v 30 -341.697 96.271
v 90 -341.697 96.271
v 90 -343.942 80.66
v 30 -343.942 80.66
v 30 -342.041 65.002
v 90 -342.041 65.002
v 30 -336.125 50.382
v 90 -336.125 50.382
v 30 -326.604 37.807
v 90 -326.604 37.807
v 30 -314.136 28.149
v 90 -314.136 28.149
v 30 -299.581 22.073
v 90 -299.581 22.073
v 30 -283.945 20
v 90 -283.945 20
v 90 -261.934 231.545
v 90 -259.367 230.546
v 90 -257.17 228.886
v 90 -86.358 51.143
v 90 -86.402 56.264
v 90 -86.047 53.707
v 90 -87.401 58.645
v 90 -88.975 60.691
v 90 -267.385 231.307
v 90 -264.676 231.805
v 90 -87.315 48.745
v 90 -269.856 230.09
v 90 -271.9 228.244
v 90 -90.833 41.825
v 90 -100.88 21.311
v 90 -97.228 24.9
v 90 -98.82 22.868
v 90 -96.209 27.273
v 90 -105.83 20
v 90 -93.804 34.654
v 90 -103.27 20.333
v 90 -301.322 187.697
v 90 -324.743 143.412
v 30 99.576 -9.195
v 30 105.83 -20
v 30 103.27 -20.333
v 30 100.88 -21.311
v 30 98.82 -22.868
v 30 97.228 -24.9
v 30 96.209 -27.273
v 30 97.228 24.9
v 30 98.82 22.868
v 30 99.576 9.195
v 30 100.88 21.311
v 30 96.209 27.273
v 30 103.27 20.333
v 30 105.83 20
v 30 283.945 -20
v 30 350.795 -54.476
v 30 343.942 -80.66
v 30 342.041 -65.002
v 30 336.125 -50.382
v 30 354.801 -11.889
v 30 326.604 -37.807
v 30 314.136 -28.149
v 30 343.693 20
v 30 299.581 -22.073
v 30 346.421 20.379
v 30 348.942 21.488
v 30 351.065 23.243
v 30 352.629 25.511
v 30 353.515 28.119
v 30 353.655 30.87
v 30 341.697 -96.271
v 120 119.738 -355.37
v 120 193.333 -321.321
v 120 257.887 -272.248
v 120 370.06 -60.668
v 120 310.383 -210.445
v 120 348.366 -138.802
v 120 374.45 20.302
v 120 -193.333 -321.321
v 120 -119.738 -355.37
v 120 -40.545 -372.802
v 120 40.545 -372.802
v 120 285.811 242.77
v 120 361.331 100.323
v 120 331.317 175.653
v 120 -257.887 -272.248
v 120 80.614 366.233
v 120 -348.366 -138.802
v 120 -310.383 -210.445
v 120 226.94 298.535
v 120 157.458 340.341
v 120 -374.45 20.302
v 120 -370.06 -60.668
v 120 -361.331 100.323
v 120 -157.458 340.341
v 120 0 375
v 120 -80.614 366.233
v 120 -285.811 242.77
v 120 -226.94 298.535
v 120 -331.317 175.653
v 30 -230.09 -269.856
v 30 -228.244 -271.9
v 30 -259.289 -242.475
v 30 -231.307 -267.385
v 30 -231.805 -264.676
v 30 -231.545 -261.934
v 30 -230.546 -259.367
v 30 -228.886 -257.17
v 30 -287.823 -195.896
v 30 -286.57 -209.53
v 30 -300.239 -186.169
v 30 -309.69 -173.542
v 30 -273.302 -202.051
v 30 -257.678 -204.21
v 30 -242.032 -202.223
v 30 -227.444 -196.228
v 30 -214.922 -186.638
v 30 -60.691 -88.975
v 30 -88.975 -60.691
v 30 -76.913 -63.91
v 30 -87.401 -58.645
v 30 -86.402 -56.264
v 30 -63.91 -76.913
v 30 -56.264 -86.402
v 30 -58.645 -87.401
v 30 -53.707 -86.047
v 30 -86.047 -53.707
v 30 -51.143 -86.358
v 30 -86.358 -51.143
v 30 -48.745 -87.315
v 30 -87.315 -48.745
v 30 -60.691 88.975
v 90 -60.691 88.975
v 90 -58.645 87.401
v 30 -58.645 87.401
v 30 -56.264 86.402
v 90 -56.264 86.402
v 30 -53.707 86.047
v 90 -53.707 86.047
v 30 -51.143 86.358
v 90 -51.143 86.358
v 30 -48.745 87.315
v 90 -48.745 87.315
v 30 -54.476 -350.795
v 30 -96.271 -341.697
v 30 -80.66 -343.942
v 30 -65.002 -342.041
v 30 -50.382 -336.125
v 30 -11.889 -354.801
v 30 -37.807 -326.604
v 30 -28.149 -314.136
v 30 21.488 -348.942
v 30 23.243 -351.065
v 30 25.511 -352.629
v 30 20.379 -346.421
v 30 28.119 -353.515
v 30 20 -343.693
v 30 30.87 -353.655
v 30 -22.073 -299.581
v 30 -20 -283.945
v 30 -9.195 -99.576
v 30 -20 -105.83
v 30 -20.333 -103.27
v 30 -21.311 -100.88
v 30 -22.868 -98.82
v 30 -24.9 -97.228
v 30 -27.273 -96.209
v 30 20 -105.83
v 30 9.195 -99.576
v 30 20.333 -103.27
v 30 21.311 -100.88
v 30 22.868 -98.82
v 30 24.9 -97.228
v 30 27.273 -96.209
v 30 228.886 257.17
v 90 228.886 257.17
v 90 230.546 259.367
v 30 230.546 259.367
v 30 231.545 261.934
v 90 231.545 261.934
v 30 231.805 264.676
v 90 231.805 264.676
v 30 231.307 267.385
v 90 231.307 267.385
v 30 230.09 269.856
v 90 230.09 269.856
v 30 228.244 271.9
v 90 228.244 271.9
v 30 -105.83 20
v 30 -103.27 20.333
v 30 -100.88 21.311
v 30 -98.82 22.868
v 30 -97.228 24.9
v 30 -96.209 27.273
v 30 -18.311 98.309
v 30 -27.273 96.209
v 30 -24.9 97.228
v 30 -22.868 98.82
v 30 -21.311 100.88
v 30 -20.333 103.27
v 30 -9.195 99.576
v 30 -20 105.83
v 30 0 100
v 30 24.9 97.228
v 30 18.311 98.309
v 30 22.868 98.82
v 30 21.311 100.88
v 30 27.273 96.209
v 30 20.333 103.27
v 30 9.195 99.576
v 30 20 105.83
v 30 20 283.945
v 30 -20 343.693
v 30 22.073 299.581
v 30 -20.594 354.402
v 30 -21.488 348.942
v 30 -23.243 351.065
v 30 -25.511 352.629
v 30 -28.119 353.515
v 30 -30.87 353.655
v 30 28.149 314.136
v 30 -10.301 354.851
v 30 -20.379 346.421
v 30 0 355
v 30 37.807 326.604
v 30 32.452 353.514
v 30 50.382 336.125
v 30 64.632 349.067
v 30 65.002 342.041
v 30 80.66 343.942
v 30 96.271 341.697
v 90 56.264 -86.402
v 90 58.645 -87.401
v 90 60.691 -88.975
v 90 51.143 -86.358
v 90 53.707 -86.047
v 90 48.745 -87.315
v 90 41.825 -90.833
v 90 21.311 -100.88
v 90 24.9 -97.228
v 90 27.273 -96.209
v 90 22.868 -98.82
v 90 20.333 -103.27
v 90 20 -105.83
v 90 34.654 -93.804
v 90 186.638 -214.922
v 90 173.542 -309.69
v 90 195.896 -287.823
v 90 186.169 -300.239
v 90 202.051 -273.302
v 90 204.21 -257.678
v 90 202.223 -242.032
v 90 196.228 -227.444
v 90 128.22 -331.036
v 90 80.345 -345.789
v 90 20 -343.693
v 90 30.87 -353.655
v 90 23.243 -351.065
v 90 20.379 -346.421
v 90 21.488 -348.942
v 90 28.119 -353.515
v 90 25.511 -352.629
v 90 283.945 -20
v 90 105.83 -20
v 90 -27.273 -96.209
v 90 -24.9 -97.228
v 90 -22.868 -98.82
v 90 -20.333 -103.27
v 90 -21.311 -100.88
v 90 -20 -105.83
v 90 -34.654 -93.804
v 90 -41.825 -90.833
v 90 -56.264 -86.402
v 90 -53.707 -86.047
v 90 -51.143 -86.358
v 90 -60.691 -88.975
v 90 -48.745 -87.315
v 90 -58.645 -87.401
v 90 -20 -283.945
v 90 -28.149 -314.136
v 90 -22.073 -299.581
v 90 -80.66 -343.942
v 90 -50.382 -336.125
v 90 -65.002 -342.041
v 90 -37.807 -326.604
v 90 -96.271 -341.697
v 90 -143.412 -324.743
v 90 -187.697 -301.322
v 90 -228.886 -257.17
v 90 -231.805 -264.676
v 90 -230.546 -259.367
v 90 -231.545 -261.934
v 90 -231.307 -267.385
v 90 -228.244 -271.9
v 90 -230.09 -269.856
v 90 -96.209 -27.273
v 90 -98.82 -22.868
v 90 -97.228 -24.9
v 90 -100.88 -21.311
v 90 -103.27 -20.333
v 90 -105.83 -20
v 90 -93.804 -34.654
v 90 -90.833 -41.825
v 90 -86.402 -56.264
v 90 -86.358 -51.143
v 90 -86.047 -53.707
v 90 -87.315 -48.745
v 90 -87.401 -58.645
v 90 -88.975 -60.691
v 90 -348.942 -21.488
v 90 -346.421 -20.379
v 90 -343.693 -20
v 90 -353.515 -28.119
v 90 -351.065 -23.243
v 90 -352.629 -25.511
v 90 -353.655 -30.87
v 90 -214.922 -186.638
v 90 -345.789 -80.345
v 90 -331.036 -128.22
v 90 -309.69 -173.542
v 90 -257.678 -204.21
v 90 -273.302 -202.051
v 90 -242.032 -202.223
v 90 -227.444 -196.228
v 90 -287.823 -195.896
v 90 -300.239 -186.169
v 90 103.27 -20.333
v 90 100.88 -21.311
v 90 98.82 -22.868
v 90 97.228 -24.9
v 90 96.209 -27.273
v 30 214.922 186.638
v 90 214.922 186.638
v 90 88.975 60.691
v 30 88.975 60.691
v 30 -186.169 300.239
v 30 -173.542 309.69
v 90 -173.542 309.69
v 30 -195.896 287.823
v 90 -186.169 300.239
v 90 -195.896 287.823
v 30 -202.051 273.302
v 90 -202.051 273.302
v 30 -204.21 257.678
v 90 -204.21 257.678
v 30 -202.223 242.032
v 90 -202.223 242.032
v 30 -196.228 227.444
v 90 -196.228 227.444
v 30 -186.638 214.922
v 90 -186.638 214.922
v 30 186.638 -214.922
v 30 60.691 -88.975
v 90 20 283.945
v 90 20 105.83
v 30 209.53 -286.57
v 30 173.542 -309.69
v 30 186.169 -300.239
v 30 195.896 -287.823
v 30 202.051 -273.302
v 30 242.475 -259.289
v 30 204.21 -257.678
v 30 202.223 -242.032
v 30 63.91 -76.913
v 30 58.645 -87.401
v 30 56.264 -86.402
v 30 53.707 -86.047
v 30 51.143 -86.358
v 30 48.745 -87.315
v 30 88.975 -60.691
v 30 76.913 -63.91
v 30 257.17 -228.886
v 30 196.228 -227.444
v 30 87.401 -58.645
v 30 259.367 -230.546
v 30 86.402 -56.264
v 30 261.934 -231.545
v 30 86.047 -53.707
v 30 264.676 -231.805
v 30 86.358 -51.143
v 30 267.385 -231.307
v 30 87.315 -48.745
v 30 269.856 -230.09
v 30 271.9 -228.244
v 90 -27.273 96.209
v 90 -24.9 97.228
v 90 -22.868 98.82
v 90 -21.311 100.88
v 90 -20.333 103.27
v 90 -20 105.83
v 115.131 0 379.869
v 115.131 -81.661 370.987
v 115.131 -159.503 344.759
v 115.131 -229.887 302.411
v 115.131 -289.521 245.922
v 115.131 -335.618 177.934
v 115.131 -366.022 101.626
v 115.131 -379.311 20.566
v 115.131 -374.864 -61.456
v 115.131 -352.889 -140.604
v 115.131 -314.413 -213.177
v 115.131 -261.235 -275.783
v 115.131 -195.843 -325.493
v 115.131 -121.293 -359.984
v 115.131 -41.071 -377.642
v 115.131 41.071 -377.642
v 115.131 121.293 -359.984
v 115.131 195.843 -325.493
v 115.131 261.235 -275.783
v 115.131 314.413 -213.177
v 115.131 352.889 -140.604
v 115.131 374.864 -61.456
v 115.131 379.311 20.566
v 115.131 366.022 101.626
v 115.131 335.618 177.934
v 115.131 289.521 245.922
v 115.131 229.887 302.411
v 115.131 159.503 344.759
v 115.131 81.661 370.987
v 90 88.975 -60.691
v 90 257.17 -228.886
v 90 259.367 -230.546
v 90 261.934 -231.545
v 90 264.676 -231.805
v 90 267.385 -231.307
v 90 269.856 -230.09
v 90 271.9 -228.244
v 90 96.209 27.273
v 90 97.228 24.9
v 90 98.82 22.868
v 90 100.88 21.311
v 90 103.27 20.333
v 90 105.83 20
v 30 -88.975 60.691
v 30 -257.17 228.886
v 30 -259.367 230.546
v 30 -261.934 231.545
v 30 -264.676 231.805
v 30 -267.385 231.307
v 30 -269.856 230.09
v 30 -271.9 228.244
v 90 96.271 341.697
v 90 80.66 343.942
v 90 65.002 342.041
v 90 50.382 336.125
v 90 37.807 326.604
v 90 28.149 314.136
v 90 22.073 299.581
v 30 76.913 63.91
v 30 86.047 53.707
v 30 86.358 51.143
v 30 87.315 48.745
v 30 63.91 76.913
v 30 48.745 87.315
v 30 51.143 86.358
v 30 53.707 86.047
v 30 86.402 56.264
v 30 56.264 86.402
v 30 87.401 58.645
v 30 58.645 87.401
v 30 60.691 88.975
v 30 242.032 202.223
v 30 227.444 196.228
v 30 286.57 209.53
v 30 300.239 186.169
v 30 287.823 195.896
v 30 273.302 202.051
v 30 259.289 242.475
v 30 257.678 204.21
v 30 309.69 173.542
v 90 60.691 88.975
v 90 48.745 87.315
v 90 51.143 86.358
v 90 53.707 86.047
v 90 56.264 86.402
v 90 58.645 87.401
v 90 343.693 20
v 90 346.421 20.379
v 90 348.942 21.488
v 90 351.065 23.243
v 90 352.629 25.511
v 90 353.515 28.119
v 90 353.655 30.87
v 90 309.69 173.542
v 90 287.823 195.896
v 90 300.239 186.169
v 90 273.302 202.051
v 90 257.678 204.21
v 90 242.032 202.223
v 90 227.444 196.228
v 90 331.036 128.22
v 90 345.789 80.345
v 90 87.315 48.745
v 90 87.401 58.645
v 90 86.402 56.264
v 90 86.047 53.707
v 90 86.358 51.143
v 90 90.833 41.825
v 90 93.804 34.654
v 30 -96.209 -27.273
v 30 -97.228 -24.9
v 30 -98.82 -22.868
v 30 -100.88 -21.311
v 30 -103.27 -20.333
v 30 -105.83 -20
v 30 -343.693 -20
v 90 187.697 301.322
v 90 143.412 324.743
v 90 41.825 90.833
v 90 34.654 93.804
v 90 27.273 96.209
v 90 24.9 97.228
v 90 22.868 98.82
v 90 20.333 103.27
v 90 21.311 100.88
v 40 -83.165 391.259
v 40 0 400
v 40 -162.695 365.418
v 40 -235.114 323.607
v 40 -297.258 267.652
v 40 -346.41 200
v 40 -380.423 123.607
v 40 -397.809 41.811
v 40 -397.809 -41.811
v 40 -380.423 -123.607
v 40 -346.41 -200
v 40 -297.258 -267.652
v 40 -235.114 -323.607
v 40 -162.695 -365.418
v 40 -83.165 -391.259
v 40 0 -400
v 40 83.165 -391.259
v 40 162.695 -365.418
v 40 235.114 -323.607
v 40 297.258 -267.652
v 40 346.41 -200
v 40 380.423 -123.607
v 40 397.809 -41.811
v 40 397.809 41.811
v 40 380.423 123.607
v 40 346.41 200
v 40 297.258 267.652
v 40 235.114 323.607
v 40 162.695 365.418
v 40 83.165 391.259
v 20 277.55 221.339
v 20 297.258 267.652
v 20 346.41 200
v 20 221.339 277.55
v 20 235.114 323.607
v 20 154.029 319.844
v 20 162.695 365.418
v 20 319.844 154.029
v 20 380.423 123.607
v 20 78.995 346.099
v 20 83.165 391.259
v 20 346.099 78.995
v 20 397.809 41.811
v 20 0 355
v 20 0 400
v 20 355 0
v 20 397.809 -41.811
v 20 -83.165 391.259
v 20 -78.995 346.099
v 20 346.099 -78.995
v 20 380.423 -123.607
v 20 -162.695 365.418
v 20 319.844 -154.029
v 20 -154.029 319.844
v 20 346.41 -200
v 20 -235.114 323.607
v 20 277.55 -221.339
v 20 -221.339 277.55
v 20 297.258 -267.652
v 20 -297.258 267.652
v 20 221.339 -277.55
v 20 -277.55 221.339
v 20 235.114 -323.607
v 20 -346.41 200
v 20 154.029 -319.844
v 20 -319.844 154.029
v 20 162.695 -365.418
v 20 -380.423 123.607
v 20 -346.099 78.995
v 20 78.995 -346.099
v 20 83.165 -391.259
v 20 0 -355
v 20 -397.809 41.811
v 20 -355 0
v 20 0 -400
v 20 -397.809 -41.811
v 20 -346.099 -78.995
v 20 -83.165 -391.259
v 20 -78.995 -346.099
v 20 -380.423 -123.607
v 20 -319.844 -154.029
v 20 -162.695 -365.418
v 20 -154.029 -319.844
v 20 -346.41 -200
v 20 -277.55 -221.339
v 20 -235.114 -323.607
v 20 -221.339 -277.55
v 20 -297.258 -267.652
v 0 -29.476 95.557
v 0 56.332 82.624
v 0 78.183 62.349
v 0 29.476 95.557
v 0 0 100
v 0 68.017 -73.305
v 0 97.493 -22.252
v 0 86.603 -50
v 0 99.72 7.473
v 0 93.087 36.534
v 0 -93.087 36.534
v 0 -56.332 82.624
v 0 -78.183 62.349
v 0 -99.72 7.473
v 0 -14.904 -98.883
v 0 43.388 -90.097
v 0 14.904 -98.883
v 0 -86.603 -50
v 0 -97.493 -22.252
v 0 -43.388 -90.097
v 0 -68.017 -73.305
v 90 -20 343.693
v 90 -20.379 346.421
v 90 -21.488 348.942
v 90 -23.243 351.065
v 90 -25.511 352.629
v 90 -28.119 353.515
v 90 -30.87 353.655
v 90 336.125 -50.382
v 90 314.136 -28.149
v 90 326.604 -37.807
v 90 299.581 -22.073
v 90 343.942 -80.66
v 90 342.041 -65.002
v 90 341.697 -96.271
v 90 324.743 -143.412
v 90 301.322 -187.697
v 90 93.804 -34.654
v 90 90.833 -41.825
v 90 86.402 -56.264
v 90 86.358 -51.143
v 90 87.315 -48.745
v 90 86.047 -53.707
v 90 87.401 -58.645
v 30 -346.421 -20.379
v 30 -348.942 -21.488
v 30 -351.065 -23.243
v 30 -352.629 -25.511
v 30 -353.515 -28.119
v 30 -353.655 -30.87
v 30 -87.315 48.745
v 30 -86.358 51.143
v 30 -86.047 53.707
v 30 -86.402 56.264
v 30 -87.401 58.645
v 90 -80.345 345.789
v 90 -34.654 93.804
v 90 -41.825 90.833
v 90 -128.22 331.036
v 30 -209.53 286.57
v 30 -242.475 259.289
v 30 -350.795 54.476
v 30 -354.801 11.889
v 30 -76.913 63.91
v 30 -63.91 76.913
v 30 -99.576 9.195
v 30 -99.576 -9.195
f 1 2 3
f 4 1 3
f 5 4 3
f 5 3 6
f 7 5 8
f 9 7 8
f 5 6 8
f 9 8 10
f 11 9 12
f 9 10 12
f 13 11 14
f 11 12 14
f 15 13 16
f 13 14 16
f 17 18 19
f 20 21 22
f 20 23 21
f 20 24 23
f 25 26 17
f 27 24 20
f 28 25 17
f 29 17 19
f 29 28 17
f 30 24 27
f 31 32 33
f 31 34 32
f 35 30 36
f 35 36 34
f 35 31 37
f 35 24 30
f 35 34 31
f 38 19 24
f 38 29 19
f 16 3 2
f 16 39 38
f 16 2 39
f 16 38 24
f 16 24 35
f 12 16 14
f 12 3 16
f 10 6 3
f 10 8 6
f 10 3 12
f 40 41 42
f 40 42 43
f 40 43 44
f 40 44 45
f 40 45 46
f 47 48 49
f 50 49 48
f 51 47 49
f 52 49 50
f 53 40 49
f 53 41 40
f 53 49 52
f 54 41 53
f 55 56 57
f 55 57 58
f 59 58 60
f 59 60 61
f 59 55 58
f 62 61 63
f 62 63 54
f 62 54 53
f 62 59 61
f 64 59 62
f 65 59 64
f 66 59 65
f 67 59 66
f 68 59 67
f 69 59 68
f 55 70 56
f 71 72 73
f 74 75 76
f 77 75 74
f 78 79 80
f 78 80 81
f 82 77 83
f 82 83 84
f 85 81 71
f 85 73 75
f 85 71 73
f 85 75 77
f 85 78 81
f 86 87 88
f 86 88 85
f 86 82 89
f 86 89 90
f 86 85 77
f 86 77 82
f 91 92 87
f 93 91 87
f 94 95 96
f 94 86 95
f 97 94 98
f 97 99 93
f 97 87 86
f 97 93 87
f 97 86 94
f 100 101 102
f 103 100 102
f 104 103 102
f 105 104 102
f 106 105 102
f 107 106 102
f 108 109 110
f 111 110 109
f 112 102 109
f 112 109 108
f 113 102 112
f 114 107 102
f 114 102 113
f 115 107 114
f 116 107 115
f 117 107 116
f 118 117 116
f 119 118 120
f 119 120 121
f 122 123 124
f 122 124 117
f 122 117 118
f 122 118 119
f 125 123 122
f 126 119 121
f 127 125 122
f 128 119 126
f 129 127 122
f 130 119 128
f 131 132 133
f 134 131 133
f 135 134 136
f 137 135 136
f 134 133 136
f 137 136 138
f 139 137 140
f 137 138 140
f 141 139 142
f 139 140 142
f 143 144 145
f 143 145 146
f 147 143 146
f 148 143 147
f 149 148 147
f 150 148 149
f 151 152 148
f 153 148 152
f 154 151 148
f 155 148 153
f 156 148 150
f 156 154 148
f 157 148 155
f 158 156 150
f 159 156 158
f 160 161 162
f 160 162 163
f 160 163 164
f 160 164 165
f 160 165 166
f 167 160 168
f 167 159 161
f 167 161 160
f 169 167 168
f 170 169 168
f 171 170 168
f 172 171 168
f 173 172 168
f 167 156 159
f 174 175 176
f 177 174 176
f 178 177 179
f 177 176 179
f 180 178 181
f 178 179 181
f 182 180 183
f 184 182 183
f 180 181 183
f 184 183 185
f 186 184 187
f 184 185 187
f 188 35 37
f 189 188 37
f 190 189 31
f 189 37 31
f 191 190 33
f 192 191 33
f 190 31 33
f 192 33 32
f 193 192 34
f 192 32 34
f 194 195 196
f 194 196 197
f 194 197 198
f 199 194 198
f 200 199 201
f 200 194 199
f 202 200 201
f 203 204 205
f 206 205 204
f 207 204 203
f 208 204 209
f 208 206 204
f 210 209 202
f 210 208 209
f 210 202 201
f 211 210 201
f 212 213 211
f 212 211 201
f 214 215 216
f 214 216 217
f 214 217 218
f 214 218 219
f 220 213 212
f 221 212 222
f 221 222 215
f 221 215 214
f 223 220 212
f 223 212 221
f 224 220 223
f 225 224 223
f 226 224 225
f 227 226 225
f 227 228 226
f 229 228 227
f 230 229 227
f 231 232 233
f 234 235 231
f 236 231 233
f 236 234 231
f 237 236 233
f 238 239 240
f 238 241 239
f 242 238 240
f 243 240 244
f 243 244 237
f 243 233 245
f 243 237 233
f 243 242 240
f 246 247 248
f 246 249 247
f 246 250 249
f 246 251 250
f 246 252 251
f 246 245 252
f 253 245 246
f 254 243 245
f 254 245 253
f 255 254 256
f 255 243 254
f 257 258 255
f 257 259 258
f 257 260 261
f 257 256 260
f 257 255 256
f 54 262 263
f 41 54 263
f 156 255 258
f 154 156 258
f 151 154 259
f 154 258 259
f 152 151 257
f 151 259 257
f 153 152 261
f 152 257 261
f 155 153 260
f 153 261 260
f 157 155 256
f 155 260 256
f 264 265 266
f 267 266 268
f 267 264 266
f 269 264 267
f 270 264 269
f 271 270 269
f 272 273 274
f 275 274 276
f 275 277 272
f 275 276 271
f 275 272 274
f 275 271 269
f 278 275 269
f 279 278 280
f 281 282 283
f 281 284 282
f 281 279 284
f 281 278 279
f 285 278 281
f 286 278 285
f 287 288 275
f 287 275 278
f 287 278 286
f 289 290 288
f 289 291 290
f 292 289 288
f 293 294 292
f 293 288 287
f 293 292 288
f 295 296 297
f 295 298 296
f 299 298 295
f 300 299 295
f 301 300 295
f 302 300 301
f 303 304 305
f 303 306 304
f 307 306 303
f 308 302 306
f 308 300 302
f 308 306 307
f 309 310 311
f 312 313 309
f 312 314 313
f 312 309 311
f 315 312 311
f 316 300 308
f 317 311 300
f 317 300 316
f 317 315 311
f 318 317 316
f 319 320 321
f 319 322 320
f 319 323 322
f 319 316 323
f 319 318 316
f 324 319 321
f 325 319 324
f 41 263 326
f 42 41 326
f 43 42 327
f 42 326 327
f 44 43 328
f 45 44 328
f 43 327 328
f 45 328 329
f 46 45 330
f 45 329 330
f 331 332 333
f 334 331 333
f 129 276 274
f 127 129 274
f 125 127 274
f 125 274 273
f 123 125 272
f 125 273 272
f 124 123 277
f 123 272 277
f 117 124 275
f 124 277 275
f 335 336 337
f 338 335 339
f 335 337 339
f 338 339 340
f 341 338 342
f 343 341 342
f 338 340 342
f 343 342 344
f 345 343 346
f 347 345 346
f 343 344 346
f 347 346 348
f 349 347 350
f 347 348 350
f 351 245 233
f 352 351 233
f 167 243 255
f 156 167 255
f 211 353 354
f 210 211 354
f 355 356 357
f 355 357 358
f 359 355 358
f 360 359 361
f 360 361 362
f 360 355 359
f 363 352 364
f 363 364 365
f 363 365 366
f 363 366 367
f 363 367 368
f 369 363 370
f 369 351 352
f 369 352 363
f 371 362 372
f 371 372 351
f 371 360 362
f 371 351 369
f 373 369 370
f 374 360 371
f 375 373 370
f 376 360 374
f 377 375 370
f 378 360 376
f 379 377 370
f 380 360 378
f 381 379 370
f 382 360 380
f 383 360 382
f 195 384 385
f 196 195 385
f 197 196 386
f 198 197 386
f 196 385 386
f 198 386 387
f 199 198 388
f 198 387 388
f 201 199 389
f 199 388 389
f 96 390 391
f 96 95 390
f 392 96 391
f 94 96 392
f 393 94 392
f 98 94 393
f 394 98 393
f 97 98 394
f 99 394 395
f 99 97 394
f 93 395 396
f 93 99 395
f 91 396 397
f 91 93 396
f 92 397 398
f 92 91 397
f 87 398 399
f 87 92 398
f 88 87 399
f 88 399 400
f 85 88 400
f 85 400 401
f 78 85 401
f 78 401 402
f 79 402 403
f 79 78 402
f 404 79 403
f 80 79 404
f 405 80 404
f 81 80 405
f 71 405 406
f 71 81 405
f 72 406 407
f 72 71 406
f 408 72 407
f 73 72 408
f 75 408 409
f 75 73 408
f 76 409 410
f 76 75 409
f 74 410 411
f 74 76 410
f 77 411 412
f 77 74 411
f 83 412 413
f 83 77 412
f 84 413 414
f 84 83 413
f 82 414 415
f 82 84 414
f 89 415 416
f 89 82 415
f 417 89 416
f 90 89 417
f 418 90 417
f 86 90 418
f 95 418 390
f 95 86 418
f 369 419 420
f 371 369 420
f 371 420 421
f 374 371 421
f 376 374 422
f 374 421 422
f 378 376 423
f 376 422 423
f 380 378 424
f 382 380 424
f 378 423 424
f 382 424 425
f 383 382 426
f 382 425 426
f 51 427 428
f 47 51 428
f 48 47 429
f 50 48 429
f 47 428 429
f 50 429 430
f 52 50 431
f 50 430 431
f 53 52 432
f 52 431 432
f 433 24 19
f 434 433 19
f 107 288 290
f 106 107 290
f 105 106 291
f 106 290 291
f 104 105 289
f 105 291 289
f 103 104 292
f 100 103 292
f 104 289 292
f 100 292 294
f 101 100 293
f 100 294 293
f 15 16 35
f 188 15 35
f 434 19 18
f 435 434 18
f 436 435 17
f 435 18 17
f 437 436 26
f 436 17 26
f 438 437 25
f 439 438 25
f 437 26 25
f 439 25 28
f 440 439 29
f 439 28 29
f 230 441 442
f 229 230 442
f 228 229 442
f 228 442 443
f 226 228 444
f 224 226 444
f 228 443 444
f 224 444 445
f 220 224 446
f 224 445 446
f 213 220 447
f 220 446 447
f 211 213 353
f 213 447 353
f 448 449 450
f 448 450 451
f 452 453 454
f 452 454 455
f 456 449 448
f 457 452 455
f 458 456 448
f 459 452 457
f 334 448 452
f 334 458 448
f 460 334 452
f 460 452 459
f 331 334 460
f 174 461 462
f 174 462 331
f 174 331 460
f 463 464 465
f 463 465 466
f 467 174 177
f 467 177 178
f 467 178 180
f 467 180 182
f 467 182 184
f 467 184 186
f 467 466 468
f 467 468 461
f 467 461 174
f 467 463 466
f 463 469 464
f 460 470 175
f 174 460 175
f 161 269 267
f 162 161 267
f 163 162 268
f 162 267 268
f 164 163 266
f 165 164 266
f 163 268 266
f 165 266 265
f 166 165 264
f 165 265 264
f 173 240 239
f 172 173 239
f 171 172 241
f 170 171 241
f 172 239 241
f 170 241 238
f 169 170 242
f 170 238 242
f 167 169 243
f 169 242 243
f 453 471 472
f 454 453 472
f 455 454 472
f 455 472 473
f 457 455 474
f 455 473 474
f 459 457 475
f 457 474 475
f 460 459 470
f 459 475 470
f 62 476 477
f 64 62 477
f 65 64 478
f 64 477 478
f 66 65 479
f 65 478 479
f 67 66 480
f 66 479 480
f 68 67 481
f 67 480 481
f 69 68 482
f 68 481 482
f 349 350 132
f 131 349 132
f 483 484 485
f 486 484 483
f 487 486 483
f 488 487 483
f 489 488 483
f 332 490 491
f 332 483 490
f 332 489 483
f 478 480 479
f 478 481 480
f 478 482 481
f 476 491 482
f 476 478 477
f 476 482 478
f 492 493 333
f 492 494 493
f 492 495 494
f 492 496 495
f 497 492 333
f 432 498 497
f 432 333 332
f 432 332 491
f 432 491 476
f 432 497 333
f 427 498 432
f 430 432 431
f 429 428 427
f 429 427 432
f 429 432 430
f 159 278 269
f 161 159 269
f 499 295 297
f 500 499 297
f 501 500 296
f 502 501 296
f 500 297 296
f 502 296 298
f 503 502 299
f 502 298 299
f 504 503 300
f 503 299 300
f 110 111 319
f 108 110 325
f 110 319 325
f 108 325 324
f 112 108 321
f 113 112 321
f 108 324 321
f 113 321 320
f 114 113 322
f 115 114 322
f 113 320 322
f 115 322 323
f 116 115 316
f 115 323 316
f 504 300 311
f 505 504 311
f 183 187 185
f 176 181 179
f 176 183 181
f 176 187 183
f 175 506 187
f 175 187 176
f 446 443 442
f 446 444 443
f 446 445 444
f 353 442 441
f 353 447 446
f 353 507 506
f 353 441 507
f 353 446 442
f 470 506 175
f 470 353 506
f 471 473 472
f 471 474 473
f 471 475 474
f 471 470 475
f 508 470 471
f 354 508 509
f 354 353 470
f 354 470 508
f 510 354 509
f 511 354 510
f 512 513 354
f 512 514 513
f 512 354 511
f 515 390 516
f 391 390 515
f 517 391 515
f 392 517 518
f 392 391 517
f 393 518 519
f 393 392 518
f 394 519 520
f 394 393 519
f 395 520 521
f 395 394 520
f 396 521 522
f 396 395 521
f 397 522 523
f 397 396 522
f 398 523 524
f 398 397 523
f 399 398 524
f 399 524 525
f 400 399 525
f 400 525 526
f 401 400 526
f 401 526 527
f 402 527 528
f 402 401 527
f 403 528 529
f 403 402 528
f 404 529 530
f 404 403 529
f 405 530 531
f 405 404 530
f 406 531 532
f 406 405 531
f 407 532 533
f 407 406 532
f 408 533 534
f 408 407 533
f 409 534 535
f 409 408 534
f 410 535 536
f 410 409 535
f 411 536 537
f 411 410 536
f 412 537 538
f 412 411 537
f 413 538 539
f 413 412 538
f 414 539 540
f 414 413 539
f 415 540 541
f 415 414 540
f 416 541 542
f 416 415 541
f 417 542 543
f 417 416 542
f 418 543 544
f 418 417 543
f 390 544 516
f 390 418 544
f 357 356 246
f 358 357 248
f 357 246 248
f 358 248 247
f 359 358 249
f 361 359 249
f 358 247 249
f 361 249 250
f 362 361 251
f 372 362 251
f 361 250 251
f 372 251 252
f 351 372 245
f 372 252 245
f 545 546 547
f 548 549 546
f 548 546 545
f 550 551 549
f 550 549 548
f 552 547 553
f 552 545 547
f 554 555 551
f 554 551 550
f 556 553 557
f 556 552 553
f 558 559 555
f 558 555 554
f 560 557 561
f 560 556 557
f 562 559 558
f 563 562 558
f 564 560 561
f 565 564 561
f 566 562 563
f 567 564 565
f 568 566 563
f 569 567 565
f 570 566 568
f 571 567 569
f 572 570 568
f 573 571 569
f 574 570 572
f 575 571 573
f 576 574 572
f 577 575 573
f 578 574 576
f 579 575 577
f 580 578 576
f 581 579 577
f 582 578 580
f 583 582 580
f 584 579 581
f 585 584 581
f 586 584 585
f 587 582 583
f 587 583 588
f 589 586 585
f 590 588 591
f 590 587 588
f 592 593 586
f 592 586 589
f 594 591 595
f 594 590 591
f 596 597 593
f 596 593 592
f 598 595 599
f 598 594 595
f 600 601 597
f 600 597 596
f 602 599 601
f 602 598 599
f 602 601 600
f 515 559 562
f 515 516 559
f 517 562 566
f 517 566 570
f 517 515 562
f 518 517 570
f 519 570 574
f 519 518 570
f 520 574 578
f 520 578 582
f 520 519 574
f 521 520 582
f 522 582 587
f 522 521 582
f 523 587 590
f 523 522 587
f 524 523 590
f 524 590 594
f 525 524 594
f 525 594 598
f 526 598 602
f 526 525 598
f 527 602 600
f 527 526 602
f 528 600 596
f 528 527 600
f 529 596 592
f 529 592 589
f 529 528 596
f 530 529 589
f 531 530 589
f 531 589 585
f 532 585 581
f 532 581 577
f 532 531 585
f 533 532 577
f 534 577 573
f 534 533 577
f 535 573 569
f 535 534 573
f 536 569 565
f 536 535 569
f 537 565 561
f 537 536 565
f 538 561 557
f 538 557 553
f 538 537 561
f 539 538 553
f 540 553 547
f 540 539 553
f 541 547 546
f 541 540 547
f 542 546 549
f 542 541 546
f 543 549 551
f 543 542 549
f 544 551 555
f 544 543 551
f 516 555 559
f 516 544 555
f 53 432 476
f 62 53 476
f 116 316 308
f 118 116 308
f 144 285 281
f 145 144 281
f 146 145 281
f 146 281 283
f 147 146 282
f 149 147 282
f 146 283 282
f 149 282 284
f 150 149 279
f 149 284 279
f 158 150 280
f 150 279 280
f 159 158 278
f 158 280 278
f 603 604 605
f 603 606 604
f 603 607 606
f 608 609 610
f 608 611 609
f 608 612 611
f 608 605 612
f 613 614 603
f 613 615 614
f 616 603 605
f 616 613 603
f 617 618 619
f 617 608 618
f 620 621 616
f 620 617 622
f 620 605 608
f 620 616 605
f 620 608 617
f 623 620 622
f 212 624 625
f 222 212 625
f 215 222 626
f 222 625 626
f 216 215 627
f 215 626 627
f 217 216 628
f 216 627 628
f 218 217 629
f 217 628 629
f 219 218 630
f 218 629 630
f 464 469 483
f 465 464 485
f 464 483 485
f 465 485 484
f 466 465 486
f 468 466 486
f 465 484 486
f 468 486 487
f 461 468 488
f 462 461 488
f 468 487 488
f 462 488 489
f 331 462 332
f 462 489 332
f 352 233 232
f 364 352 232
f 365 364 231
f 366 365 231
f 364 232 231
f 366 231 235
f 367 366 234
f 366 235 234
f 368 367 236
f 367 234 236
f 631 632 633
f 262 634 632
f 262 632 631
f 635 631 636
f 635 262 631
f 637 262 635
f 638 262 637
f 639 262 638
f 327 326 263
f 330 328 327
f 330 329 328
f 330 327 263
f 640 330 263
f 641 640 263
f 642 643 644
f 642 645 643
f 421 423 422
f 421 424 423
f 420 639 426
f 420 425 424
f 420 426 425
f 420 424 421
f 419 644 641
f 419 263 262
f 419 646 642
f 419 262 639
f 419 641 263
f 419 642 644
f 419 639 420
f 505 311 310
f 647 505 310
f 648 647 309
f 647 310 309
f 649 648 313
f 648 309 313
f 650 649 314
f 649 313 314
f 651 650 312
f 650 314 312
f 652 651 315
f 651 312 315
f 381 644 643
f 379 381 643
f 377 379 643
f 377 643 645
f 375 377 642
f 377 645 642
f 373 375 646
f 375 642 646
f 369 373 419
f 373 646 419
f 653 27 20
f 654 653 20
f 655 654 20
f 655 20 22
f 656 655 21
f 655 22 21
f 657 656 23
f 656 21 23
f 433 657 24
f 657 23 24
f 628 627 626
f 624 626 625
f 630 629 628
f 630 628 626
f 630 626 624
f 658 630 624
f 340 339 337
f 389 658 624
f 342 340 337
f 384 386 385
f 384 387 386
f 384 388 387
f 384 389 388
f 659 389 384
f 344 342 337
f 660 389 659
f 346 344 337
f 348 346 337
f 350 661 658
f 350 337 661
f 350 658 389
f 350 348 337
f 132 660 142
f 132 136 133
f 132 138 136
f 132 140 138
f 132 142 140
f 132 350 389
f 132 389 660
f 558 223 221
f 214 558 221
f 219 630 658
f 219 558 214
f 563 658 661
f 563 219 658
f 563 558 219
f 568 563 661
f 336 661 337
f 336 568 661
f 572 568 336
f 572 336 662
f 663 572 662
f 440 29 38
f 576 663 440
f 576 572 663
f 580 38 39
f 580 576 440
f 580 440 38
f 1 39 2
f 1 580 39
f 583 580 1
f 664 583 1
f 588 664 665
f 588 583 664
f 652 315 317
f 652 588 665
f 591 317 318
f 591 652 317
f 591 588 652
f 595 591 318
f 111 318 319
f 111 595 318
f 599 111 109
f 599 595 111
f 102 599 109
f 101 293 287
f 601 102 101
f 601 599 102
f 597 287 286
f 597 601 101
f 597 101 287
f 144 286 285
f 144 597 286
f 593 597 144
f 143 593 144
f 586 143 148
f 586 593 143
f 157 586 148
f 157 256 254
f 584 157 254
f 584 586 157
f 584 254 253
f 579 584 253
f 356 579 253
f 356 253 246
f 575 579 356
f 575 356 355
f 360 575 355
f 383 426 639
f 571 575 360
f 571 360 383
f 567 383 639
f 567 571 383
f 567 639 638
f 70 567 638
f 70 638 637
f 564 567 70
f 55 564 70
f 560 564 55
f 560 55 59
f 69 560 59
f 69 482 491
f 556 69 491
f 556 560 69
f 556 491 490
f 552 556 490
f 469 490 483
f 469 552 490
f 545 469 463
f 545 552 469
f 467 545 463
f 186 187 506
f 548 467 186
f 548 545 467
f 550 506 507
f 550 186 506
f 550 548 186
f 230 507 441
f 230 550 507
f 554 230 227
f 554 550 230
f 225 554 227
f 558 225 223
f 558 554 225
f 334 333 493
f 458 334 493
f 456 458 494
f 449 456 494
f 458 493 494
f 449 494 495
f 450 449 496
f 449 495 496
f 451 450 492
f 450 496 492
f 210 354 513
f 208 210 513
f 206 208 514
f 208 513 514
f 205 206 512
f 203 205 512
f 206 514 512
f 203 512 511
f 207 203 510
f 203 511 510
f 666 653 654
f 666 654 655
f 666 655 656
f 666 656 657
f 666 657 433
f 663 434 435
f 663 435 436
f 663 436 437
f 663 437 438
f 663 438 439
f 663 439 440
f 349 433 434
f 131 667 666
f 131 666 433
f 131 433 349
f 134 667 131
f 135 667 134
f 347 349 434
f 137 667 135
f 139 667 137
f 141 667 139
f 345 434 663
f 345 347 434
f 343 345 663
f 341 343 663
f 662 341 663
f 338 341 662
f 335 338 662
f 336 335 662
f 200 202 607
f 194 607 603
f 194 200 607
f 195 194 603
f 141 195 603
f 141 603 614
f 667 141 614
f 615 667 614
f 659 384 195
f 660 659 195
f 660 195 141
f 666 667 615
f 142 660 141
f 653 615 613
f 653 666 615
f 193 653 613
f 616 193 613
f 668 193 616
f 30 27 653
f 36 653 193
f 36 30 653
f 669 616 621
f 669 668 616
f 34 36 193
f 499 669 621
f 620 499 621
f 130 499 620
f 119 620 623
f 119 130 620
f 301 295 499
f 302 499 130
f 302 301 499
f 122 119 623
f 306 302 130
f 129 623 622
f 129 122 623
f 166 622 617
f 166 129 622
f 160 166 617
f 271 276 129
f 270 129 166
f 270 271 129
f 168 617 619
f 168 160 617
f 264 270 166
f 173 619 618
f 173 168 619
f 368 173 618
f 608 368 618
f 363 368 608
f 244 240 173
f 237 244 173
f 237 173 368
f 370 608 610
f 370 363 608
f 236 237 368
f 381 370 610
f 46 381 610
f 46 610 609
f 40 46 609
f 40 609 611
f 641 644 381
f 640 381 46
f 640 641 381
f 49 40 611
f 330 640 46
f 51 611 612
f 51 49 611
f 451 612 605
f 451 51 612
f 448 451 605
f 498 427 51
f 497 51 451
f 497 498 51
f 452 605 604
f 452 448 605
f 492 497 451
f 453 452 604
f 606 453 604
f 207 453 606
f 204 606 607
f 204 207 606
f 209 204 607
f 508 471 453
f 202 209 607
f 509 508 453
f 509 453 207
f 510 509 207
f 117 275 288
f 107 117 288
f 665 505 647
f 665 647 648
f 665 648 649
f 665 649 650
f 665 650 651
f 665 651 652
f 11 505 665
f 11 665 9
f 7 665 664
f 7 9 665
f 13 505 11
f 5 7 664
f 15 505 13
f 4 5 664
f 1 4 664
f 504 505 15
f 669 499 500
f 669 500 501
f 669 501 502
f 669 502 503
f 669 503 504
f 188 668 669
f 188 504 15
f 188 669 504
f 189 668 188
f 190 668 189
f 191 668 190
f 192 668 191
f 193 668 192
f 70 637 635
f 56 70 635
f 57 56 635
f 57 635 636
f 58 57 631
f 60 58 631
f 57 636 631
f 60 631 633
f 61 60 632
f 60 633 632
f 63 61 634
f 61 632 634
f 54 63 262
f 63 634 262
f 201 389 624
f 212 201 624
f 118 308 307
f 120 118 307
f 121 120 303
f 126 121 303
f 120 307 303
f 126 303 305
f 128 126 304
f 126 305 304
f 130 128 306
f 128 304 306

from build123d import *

# Parameters (mm, degrees)
EXTRUDE_6_DEPTH = 60


with BuildPart() as part:
    # Эскиз1 → Повернуть7 (revolve)
    with BuildSketch(Plane.XY, mode=Mode.PRIVATE) as revolve_7_sk:
        Polygon((120, 0), (0, 0), (0, -100), (90, -100), (90, -355), (20, -355), (20, -400), (40, -400), (115.131397208, -379.868602792), (120, -375), align=None)
    revolve(revolve_7_sk.sketch.rotate(Axis((0, 0, 0), (1, 0, 0)), 270), axis=Axis((0, 0, 0), (1, 0, 0)))

    # Эскиз3 → Бобышка-Вытянуть6 (add)
    with BuildSketch(Plane.ZY.offset(-90)):
        with BuildLine():
            ThreePointArc((-48.745403909, -87.314864701), (-70.710678119, -70.710678119), (-87.314864701, -48.745403909))
            ThreePointArc((-87.314864701, -48.745403909), (-86.141576096, -54.996690721), (-88.975283359, -60.691012112))
            Line((-88.975283359, -60.691012112), (-257.169911814, -228.885640567))
            ThreePointArc((-257.169911814, -228.885640567), (-264.676174548, -231.805098536), (-271.900138456, -228.243980661))
            ThreePointArc((-271.900138456, -228.243980661), (-226.413585645, -273.42620254), (-173.542276552, -309.690294083))
            ThreePointArc((-173.542276552, -309.690294083), (-203.646432227, -265.561170399), (-186.637594429, -214.921865676))
            Line((-186.637594429, -214.921865676), (-60.691012112, -88.975283359))
            ThreePointArc((-60.691012112, -88.975283359), (-54.996690721, -86.141576096), (-48.745403909, -87.314864701))
        make_face()
        with BuildLine():
            ThreePointArc((-96.209138584, -27.272727273), (-100, 0), (-96.209138584, 27.272727273))
            ThreePointArc((-96.209138584, 27.272727273), (-99.799825551, 22.022759648), (-105.830052443, 20))
            Line((-105.830052443, 20), (-343.693177122, 20))
            ThreePointArc((-343.693177122, 20), (-351.065274929, 23.243360753), (-353.655298198, 30.869565217))
            ThreePointArc((-353.655298198, 30.869565217), (-353.440103732, -33.242940208), (-341.697027586, -96.271186441))
            ThreePointArc((-341.697027586, -96.271186441), (-331.779877601, -43.780331217), (-283.94541729, -20))
            Line((-283.94541729, -20), (-105.830052443, -20))
            ThreePointArc((-105.830052443, -20), (-99.799825551, -22.022759648), (-96.209138584, -27.272727273))
        make_face()
        with BuildLine():
            ThreePointArc((-87.314864701, 48.745403909), (-70.710678119, 70.710678119), (-48.745403909, 87.314864701))
            ThreePointArc((-48.745403909, 87.314864701), (-54.996690721, 86.141576096), (-60.691012112, 88.975283359))
            Line((-60.691012112, 88.975283359), (-228.885640567, 257.169911814))
            ThreePointArc((-228.885640567, 257.169911814), (-231.805098536, 264.676174548), (-228.243980661, 271.900138456))
            ThreePointArc((-228.243980661, 271.900138456), (-273.42620254, 226.413585645), (-309.690294083, 173.542276552))
            ThreePointArc((-309.690294083, 173.542276552), (-265.561170399, 203.646432227), (-214.921865676, 186.637594429))
            Line((-214.921865676, 186.637594429), (-88.975283359, 60.691012112))
            ThreePointArc((-88.975283359, 60.691012112), (-86.141576096, 54.996690721), (-87.314864701, 48.745403909))
        make_face()
        with BuildLine():
            ThreePointArc((27.272727273, 96.209138584), (22.022759648, 99.799825551), (20, 105.830052443))
            Line((20, 105.830052443), (20, 343.693177122))
            ThreePointArc((20, 343.693177122), (23.243360753, 351.065274929), (30.869565217, 353.655298198))
            ThreePointArc((30.869565217, 353.655298198), (-33.242940208, 353.440103732), (-96.271186441, 341.697027586))
            ThreePointArc((-96.271186441, 341.697027586), (-43.780331217, 331.779877601), (-20, 283.94541729))
            Line((-20, 283.94541729), (-20, 105.830052443))
            ThreePointArc((-20, 105.830052443), (-22.022759648, 99.799825551), (-27.272727273, 96.209138584))
            ThreePointArc((-27.272727273, 96.209138584), (0, 100), (27.272727273, 96.209138584))
        make_face()
        with BuildLine():
            ThreePointArc((60.691012112, 88.975283359), (54.996690721, 86.141576096), (48.745403909, 87.314864701))
            ThreePointArc((48.745403909, 87.314864701), (70.710678119, 70.710678119), (87.314864701, 48.745403909))
            ThreePointArc((87.314864701, 48.745403909), (86.141576096, 54.996690721), (88.975283359, 60.691012112))
            Line((88.975283359, 60.691012112), (257.169911814, 228.885640567))
            ThreePointArc((257.169911814, 228.885640567), (264.676174548, 231.805098536), (271.900138456, 228.243980661))
            ThreePointArc((271.900138456, 228.243980661), (226.413585645, 273.42620254), (173.542276552, 309.690294083))
            ThreePointArc((173.542276552, 309.690294083), (203.646432227, 265.561170399), (186.637594429, 214.921865676))
            Line((186.637594429, 214.921865676), (60.691012112, 88.975283359))
        make_face()
        with BuildLine():
            ThreePointArc((105.830052443, 20), (99.799825551, 22.022759648), (96.209138584, 27.272727273))
            ThreePointArc((96.209138584, 27.272727273), (99.047750753, 13.767464211), (100, 0))
            ThreePointArc((100, 0), (99.047750753, -13.767464211), (96.209138584, -27.272727273))
            ThreePointArc((96.209138584, -27.272727273), (99.799825551, -22.022759648), (105.830052443, -20))
            Line((105.830052443, -20), (343.693177122, -20))
            ThreePointArc((343.693177122, -20), (351.065274929, -23.243360753), (353.655298198, -30.869565217))
            ThreePointArc((353.655298198, -30.869565217), (354.663665224, -15.449419727), (355, 0))
            ThreePointArc((355, 0), (351.658530959, 48.592978952), (341.697027586, 96.271186441))
            ThreePointArc((341.697027586, 96.271186441), (331.779877601, 43.780331217), (283.94541729, 20))
            Line((283.94541729, 20), (105.830052443, 20))
        make_face()
        with BuildLine():
            ThreePointArc((88.975283359, -60.691012112), (86.141576096, -54.996690721), (87.314864701, -48.745403909))
            ThreePointArc((87.314864701, -48.745403909), (70.710678119, -70.710678119), (48.745403909, -87.314864701))
            ThreePointArc((48.745403909, -87.314864701), (54.996690721, -86.141576096), (60.691012112, -88.975283359))
            Line((60.691012112, -88.975283359), (228.885640567, -257.169911814))
            ThreePointArc((228.885640567, -257.169911814), (231.805098536, -264.676174548), (228.243980661, -271.900138456))
            ThreePointArc((228.243980661, -271.900138456), (273.42620254, -226.413585645), (309.690294083, -173.542276552))
            ThreePointArc((309.690294083, -173.542276552), (265.561170399, -203.646432227), (214.921865676, -186.637594429))
            Line((214.921865676, -186.637594429), (88.975283359, -60.691012112))
        make_face()
        with BuildLine():
            ThreePointArc((20, -105.830052443), (22.022759648, -99.799825551), (27.272727273, -96.209138584))
            ThreePointArc((27.272727273, -96.209138584), (0, -100), (-27.272727273, -96.209138584))
            ThreePointArc((-27.272727273, -96.209138584), (-22.022759648, -99.799825551), (-20, -105.830052443))
            Line((-20, -105.830052443), (-20, -343.693177122))
            ThreePointArc((-20, -343.693177122), (-23.243360753, -351.065274929), (-30.869565217, -353.655298198))
            ThreePointArc((-30.869565217, -353.655298198), (33.242940208, -353.440103732), (96.271186441, -341.697027586))
            ThreePointArc((96.271186441, -341.697027586), (43.780331217, -331.779877601), (20, -283.94541729))
            Line((20, -283.94541729), (20, -105.830052443))
        make_face()
    extrude(amount=EXTRUDE_6_DEPTH)


solid = part.part
